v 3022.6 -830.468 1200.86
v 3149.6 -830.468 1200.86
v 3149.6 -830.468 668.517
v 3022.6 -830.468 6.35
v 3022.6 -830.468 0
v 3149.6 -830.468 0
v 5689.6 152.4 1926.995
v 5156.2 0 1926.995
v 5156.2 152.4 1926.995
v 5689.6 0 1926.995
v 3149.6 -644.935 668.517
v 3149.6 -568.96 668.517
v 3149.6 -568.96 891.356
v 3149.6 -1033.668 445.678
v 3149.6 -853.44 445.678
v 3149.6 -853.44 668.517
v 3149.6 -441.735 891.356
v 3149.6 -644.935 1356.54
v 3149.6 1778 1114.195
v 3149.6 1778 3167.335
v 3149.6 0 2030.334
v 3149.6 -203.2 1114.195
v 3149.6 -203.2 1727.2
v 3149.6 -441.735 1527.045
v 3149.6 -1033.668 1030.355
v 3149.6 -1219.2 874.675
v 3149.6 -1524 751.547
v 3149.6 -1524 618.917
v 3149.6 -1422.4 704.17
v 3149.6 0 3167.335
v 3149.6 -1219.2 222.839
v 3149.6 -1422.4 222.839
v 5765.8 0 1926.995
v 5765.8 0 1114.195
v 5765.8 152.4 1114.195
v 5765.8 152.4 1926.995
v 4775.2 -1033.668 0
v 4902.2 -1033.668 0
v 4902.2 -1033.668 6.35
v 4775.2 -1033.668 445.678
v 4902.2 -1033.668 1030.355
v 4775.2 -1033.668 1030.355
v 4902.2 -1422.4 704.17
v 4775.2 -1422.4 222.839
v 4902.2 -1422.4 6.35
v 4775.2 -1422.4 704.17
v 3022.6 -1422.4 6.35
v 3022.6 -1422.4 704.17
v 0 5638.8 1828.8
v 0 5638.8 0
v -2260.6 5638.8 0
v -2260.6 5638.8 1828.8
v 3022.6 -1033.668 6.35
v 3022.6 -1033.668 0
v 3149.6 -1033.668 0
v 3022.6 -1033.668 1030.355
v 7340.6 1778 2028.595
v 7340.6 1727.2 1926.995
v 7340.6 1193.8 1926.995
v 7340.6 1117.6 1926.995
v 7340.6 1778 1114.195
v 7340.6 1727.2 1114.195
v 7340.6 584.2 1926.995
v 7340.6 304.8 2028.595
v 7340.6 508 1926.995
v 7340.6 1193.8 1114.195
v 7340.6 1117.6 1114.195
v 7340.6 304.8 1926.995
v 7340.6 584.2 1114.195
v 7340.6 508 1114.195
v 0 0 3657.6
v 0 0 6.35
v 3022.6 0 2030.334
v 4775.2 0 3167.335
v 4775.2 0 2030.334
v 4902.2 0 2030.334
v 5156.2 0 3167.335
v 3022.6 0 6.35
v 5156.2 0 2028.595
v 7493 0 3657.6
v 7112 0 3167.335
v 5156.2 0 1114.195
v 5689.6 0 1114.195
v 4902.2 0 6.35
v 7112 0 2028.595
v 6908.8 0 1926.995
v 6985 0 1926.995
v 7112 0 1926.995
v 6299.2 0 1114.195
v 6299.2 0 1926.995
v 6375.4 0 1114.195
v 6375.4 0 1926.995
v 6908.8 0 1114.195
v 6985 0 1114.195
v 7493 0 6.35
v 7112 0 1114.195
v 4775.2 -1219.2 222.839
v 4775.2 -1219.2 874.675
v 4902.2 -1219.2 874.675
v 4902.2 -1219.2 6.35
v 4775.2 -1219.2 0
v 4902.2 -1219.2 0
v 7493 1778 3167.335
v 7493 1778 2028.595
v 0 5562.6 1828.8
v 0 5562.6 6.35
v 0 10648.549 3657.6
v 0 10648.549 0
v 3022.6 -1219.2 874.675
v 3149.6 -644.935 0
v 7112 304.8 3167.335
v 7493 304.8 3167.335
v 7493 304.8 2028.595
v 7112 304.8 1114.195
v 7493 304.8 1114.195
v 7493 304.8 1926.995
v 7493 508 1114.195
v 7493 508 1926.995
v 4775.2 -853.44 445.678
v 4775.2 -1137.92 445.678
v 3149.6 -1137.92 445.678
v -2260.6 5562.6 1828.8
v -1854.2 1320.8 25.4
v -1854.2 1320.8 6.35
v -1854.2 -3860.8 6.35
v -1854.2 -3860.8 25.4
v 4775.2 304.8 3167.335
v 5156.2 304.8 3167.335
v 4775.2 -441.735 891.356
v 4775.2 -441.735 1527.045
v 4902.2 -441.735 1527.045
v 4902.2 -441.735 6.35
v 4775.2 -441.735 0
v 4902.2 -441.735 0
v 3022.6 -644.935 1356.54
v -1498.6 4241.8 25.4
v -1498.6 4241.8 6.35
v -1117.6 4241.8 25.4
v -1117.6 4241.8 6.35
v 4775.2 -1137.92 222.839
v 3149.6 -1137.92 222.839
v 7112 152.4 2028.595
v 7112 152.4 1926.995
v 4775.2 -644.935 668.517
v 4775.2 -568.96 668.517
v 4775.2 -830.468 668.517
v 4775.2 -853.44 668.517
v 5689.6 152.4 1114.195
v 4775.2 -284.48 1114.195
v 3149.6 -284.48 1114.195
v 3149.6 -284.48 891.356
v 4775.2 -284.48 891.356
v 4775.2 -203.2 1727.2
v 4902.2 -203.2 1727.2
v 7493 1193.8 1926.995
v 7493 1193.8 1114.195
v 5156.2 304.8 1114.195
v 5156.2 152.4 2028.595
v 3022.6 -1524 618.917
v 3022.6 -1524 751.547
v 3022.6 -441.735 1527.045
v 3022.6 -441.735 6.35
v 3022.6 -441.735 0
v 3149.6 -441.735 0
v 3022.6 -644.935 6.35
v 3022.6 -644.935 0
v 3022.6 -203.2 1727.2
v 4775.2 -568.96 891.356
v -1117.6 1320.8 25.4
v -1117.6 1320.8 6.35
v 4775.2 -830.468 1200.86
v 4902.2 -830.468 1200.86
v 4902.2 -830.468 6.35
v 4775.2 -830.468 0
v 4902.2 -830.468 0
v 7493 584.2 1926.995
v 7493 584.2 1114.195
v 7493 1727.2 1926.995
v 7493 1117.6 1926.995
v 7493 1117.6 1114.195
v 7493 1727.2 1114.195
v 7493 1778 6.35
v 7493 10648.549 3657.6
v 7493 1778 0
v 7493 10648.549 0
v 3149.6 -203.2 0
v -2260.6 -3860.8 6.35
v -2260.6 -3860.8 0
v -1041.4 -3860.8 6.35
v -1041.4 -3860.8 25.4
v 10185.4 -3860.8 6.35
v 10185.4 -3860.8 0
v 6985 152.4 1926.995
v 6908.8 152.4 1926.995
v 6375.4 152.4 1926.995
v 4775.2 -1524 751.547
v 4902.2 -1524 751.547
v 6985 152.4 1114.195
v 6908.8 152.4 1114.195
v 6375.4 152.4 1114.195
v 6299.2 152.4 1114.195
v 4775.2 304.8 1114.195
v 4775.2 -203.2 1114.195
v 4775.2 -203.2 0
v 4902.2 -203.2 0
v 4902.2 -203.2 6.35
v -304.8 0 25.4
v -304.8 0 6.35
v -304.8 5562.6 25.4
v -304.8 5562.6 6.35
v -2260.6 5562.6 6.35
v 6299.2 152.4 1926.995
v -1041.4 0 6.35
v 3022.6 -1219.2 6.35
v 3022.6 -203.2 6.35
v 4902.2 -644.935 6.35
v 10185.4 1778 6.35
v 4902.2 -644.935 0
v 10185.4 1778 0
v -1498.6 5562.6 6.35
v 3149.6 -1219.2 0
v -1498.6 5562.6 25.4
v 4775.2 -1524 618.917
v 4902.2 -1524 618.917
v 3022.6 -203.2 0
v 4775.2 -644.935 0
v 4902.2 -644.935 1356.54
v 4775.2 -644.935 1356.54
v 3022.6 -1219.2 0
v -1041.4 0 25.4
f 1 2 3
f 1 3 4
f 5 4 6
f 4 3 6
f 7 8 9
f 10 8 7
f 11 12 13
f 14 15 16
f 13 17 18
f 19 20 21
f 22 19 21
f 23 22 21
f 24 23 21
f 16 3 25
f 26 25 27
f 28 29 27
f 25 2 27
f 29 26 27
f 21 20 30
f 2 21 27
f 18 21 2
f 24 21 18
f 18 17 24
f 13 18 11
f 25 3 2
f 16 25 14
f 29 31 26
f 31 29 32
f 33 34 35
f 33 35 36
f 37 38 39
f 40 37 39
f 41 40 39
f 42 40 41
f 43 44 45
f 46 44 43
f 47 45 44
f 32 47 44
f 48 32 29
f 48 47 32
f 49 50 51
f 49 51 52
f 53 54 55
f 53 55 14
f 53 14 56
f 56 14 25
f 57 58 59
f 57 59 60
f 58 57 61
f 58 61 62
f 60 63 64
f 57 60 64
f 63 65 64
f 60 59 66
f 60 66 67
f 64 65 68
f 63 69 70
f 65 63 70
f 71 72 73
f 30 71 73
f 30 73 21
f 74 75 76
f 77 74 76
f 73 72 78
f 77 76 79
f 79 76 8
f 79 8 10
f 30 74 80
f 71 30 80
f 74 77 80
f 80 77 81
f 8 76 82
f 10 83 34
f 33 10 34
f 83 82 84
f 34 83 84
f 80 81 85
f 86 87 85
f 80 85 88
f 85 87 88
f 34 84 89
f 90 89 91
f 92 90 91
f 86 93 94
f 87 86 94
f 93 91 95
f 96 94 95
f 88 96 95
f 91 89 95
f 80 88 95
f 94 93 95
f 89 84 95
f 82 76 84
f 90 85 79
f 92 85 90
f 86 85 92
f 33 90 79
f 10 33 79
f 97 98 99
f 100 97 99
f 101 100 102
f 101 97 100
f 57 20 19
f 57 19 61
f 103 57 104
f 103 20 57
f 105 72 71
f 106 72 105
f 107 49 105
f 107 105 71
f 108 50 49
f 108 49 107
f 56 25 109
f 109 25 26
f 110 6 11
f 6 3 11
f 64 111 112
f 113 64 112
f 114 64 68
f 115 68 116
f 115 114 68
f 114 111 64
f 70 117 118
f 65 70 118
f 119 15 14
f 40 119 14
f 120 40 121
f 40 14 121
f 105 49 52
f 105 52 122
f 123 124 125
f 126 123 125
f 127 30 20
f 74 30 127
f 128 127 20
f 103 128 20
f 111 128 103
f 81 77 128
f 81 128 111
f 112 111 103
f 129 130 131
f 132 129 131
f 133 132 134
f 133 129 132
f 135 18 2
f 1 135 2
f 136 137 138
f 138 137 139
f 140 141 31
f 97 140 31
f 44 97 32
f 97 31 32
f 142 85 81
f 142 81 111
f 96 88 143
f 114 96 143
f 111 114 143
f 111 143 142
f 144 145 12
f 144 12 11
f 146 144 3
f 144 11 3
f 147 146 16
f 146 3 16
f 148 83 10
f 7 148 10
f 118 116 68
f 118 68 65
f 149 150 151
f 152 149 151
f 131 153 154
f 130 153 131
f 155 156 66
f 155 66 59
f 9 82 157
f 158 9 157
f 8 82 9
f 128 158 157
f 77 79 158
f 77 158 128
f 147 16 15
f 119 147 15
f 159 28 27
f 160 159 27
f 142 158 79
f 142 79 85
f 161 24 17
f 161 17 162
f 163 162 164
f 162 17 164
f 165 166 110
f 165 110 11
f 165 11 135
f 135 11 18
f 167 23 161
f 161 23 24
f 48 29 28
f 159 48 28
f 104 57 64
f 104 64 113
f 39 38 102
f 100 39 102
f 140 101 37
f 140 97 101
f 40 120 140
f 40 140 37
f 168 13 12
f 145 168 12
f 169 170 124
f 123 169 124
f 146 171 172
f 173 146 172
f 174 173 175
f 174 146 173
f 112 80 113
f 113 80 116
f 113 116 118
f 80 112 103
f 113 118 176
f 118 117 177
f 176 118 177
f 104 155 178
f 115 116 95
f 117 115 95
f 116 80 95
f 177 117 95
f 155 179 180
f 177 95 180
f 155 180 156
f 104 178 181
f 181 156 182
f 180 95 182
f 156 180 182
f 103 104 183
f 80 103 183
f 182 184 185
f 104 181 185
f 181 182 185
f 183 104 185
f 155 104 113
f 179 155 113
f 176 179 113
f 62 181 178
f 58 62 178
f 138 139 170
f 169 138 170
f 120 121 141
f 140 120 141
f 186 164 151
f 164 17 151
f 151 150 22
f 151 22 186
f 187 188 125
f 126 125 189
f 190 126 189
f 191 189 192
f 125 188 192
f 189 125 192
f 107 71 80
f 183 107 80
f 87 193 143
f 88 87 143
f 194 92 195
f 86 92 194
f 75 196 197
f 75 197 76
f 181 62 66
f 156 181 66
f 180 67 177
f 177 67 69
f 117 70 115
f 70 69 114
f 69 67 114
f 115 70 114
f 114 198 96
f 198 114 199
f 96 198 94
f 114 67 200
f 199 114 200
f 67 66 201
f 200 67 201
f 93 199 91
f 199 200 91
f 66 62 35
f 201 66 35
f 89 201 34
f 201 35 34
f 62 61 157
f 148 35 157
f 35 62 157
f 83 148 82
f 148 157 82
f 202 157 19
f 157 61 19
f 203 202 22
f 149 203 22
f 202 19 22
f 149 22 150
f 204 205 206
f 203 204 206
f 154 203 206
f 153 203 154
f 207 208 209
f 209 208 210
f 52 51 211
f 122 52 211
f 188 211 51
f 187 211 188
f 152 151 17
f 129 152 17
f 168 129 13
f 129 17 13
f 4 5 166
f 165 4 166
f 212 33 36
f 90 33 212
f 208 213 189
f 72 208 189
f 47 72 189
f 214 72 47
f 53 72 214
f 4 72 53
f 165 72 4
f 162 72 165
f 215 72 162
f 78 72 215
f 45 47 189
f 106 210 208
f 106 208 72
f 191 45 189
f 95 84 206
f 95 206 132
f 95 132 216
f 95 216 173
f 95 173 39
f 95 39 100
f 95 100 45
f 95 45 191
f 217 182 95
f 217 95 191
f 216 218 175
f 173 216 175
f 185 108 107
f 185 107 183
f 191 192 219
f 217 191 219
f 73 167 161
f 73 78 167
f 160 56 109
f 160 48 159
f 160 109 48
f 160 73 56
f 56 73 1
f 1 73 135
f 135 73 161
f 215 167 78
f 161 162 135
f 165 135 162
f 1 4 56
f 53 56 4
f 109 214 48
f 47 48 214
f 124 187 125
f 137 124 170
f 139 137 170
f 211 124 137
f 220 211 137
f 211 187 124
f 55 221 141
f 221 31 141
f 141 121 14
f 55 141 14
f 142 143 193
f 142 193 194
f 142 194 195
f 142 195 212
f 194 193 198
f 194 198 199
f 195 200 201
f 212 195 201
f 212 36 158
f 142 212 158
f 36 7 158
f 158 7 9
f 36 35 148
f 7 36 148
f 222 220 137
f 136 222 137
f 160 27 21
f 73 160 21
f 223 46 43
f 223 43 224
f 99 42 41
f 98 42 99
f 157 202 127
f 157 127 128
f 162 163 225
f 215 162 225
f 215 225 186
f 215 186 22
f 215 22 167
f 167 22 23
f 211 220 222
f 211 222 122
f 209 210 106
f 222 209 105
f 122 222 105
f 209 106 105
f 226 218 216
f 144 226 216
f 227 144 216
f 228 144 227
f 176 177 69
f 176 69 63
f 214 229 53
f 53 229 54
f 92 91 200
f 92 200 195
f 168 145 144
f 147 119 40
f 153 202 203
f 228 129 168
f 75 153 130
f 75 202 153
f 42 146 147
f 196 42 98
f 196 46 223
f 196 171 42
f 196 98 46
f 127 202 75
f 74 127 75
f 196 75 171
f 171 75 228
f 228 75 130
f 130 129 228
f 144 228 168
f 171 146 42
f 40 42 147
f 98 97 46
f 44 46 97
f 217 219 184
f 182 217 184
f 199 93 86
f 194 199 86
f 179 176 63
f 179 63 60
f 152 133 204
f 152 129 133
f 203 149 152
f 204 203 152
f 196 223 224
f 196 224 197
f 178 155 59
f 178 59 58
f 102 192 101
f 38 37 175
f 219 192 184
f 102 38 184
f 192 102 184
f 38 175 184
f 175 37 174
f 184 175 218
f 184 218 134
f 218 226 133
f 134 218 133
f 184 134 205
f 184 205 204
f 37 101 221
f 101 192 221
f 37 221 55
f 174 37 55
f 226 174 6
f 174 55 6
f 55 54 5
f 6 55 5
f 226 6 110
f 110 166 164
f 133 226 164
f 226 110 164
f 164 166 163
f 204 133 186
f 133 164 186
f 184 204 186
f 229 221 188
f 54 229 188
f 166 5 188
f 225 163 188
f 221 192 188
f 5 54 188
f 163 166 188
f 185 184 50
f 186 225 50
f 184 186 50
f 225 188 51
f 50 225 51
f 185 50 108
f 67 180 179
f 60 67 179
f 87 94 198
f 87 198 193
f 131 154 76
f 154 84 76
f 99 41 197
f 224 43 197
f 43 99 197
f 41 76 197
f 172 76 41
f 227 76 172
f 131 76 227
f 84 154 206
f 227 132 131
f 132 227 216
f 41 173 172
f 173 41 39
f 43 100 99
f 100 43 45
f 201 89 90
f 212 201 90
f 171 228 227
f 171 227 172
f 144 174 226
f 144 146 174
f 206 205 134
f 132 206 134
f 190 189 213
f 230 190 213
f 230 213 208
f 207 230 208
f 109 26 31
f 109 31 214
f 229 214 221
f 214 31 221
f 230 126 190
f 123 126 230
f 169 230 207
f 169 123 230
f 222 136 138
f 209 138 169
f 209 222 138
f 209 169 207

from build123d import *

# Parameters (mm, degrees)
F2_W      = 7493
F2_H      = 10648.549079895
F3_DEPTH  = 3657.6
F4_W      = 4343.4
F4_H      = 2053.1401527691
F5_DEPTH  = 1778
F7_DEPTH  = 914.4
F8_W      = 533.4
F8_H      = 812.8
F9_DEPTH  = 304.8
F10_W     = 533.4
F10_H     = 812.8
F11_DEPTH = 254
F12_W     = 381
F12_H     = 304.8
F13_DEPTH = 2540
F14_W     = 203.2
F14_H     = 812.8
F15_DEPTH = 254
F16_W     = 127
F16_H     = 812.8
F18_DEPTH = 254
F20_DEPTH = 1625.6
F22_DEPTH = 127
F24_W     = 76.2
F24_H     = 1828.8
F25_DEPTH = 2260.6
F26_DEPTH = 25.4
F28_DEPTH = 6.35


# Not quite as in the source:
# - a pattern or mirror of a feature is missing from the dataset's text; its kind, count and spacing are read off the source's solid


with BuildPart() as f3:
    # F2 (on Top) → F3 (new body)
    with BuildSketch(Plane.XY):
        with Locations((3746.5, 5324.2745399475)):
            Rectangle(F2_W, F2_H)
    extrude(amount=F3_DEPTH)

    # F4 (on face) → F5 (cut)
    with BuildSketch(Plane.XZ):
        with Locations((5321.3, 2140.7647186136)):
            Rectangle(F4_W, F4_H)
    extrude(amount=-F5_DEPTH, mode=Mode.SUBTRACT)

    # F6 (on face) → F7 (join)
    with BuildSketch(Plane.XY.offset(1114.1946422291)):
        Polygon((4775.2, 152.4), (4775.2, 0), (7493, 0), (7493, 1778), (7340.6, 1778), (7340.6, 152.4), align=None)
    extrude(amount=F7_DEPTH)

    # F8 (on face) → F9 (cut)
    with BuildSketch(Plane.XZ):
        with Locations((5422.9, 1520.5946422291)):
            Rectangle(F8_W, F8_H)
        with Locations((6032.5, 1520.5946422291)):
            Rectangle(F8_W, F8_H)
        with Locations((6642.1, 1520.5946422291)):
            Rectangle(F8_W, F8_H)
    extrude(amount=-F9_DEPTH, mode=Mode.SUBTRACT)

    # F10 (on face) → F11 (cut)
    with BuildSketch(Plane.YZ.offset(7493)):
        with Locations((1460.5, 1520.5946422291)):
            Rectangle(F10_W, F10_H)
        with Locations((850.9, 1520.5946422291)):
            Rectangle(F10_W, F10_H)
    extrude(amount=-F11_DEPTH, mode=Mode.SUBTRACT)

    # F12 (on face) → F13 (join)
    with BuildSketch(Plane.XY.offset(1114.1946422291)):
        with Locations((4965.7, 152.4)):
            Rectangle(F12_W, F12_H)
        with Locations((7302.5, 152.4)):
            Rectangle(F12_W, F12_H)
    extrude(amount=F13_DEPTH)

    # F14 (on face) → F15 (cut)
    with BuildSketch(Plane.YZ.offset(7493)):
        with Locations((406.4, 1520.5946422291)):
            Rectangle(F14_W, F14_H)
    extrude(amount=-F15_DEPTH, mode=Mode.SUBTRACT)

    # F16 (on face) → F18 (cut)
    with BuildSketch(Plane.XZ):
        with Locations((7048.5, 1520.5946422291)):
            Rectangle(F16_W, F16_H)
    extrude(amount=-F18_DEPTH, mode=Mode.SUBTRACT)

    # F19 (on offset) → F20 (join, through all)
    with BuildSketch(Plane.YZ.offset(3149.6)):
        Polygon((0, 0), (0, 1114.1946422291), (-284.48, 1114.1946422291), (-284.48, 891.3557137833), (-568.96, 891.3557137833), (-568.96, 668.5167853374), (-853.44, 668.5167853374), (-853.44, 445.6778568916), (-1137.92, 445.6778568916), (-1137.92, 222.8389284458), (-1422.4, 222.8389284458), (-1422.4, 0), align=None)
    extrude(amount=F20_DEPTH)

    # F21 (on face) → F22 (join)
    with BuildSketch(Plane(origin=(3149.6, 0, 0), x_dir=(0, -1, 0), z_dir=(-1, 0, 0))):
        Polygon((1524, 751.5465877372), (0, 2030.3344256514), (0, 0), (203.2, 0), (203.2, 1727.2), (441.7354282745, 1527.0450101121), (441.7354282745, 0), (644.9354282745, 0), (644.9354282745, 1356.5399650569), (830.4677141373, 1200.859892418), (830.4677141373, 0), (1033.6677141373, 0), (1033.6677141373, 1030.3548473628), (1219.2, 874.6747747239), (1219.2, 0), (1422.4, 0), (1422.4, 704.1697296687), (1524, 618.917207141), align=None)
    f22 = extrude(amount=F22_DEPTH)

    # F22_copies: F22 across plane
    add(f22.mirror(Plane(origin=(3962.4, 0, 0), x_dir=(0, 0, 1), z_dir=(1, 0, 0))))

    # F24 (on face) → F25 (join, through all)
    with BuildSketch(Plane(origin=(0, 0, 0), x_dir=(0, -1, 0), z_dir=(-1, 0, 0))):
        with Locations((-5600.7, 914.4)):
            Rectangle(F24_W, F24_H)
    extrude(amount=F25_DEPTH)

    # F1 (on Top) → F26 (join)
    with BuildSketch(Plane.XY):
        Polygon((-304.8, 5562.6), (-1498.6, 5562.6), (-1498.6, 4241.8), (-1117.6, 4241.8), (-1117.6, 1320.8), (-1854.2, 1320.8), (-1854.2, -3860.8), (-1041.4, -3860.8), (-1041.4, 0), (-304.8, 0), (-304.8, 4244.8759078979), align=None)
    extrude(amount=F26_DEPTH)

    # F27 (on Top) → F28 (join)
    with BuildSketch(Plane.XY):
        Polygon((0, 5562.6), (-2260.6000000001, 5562.6), (-2260.6000000001, -3860.8), (0, -3860.8), (10185.4, -3860.8), (10185.4, 1778), (7493, 1778), (7493, 0), (4902.2, 0), (4902.2, -1422.4), (4775.2, -1422.4), (3022.6, -1422.4), (3022.6, 0), (0, 0), align=None)
    extrude(amount=F28_DEPTH)


solid = f3.part
